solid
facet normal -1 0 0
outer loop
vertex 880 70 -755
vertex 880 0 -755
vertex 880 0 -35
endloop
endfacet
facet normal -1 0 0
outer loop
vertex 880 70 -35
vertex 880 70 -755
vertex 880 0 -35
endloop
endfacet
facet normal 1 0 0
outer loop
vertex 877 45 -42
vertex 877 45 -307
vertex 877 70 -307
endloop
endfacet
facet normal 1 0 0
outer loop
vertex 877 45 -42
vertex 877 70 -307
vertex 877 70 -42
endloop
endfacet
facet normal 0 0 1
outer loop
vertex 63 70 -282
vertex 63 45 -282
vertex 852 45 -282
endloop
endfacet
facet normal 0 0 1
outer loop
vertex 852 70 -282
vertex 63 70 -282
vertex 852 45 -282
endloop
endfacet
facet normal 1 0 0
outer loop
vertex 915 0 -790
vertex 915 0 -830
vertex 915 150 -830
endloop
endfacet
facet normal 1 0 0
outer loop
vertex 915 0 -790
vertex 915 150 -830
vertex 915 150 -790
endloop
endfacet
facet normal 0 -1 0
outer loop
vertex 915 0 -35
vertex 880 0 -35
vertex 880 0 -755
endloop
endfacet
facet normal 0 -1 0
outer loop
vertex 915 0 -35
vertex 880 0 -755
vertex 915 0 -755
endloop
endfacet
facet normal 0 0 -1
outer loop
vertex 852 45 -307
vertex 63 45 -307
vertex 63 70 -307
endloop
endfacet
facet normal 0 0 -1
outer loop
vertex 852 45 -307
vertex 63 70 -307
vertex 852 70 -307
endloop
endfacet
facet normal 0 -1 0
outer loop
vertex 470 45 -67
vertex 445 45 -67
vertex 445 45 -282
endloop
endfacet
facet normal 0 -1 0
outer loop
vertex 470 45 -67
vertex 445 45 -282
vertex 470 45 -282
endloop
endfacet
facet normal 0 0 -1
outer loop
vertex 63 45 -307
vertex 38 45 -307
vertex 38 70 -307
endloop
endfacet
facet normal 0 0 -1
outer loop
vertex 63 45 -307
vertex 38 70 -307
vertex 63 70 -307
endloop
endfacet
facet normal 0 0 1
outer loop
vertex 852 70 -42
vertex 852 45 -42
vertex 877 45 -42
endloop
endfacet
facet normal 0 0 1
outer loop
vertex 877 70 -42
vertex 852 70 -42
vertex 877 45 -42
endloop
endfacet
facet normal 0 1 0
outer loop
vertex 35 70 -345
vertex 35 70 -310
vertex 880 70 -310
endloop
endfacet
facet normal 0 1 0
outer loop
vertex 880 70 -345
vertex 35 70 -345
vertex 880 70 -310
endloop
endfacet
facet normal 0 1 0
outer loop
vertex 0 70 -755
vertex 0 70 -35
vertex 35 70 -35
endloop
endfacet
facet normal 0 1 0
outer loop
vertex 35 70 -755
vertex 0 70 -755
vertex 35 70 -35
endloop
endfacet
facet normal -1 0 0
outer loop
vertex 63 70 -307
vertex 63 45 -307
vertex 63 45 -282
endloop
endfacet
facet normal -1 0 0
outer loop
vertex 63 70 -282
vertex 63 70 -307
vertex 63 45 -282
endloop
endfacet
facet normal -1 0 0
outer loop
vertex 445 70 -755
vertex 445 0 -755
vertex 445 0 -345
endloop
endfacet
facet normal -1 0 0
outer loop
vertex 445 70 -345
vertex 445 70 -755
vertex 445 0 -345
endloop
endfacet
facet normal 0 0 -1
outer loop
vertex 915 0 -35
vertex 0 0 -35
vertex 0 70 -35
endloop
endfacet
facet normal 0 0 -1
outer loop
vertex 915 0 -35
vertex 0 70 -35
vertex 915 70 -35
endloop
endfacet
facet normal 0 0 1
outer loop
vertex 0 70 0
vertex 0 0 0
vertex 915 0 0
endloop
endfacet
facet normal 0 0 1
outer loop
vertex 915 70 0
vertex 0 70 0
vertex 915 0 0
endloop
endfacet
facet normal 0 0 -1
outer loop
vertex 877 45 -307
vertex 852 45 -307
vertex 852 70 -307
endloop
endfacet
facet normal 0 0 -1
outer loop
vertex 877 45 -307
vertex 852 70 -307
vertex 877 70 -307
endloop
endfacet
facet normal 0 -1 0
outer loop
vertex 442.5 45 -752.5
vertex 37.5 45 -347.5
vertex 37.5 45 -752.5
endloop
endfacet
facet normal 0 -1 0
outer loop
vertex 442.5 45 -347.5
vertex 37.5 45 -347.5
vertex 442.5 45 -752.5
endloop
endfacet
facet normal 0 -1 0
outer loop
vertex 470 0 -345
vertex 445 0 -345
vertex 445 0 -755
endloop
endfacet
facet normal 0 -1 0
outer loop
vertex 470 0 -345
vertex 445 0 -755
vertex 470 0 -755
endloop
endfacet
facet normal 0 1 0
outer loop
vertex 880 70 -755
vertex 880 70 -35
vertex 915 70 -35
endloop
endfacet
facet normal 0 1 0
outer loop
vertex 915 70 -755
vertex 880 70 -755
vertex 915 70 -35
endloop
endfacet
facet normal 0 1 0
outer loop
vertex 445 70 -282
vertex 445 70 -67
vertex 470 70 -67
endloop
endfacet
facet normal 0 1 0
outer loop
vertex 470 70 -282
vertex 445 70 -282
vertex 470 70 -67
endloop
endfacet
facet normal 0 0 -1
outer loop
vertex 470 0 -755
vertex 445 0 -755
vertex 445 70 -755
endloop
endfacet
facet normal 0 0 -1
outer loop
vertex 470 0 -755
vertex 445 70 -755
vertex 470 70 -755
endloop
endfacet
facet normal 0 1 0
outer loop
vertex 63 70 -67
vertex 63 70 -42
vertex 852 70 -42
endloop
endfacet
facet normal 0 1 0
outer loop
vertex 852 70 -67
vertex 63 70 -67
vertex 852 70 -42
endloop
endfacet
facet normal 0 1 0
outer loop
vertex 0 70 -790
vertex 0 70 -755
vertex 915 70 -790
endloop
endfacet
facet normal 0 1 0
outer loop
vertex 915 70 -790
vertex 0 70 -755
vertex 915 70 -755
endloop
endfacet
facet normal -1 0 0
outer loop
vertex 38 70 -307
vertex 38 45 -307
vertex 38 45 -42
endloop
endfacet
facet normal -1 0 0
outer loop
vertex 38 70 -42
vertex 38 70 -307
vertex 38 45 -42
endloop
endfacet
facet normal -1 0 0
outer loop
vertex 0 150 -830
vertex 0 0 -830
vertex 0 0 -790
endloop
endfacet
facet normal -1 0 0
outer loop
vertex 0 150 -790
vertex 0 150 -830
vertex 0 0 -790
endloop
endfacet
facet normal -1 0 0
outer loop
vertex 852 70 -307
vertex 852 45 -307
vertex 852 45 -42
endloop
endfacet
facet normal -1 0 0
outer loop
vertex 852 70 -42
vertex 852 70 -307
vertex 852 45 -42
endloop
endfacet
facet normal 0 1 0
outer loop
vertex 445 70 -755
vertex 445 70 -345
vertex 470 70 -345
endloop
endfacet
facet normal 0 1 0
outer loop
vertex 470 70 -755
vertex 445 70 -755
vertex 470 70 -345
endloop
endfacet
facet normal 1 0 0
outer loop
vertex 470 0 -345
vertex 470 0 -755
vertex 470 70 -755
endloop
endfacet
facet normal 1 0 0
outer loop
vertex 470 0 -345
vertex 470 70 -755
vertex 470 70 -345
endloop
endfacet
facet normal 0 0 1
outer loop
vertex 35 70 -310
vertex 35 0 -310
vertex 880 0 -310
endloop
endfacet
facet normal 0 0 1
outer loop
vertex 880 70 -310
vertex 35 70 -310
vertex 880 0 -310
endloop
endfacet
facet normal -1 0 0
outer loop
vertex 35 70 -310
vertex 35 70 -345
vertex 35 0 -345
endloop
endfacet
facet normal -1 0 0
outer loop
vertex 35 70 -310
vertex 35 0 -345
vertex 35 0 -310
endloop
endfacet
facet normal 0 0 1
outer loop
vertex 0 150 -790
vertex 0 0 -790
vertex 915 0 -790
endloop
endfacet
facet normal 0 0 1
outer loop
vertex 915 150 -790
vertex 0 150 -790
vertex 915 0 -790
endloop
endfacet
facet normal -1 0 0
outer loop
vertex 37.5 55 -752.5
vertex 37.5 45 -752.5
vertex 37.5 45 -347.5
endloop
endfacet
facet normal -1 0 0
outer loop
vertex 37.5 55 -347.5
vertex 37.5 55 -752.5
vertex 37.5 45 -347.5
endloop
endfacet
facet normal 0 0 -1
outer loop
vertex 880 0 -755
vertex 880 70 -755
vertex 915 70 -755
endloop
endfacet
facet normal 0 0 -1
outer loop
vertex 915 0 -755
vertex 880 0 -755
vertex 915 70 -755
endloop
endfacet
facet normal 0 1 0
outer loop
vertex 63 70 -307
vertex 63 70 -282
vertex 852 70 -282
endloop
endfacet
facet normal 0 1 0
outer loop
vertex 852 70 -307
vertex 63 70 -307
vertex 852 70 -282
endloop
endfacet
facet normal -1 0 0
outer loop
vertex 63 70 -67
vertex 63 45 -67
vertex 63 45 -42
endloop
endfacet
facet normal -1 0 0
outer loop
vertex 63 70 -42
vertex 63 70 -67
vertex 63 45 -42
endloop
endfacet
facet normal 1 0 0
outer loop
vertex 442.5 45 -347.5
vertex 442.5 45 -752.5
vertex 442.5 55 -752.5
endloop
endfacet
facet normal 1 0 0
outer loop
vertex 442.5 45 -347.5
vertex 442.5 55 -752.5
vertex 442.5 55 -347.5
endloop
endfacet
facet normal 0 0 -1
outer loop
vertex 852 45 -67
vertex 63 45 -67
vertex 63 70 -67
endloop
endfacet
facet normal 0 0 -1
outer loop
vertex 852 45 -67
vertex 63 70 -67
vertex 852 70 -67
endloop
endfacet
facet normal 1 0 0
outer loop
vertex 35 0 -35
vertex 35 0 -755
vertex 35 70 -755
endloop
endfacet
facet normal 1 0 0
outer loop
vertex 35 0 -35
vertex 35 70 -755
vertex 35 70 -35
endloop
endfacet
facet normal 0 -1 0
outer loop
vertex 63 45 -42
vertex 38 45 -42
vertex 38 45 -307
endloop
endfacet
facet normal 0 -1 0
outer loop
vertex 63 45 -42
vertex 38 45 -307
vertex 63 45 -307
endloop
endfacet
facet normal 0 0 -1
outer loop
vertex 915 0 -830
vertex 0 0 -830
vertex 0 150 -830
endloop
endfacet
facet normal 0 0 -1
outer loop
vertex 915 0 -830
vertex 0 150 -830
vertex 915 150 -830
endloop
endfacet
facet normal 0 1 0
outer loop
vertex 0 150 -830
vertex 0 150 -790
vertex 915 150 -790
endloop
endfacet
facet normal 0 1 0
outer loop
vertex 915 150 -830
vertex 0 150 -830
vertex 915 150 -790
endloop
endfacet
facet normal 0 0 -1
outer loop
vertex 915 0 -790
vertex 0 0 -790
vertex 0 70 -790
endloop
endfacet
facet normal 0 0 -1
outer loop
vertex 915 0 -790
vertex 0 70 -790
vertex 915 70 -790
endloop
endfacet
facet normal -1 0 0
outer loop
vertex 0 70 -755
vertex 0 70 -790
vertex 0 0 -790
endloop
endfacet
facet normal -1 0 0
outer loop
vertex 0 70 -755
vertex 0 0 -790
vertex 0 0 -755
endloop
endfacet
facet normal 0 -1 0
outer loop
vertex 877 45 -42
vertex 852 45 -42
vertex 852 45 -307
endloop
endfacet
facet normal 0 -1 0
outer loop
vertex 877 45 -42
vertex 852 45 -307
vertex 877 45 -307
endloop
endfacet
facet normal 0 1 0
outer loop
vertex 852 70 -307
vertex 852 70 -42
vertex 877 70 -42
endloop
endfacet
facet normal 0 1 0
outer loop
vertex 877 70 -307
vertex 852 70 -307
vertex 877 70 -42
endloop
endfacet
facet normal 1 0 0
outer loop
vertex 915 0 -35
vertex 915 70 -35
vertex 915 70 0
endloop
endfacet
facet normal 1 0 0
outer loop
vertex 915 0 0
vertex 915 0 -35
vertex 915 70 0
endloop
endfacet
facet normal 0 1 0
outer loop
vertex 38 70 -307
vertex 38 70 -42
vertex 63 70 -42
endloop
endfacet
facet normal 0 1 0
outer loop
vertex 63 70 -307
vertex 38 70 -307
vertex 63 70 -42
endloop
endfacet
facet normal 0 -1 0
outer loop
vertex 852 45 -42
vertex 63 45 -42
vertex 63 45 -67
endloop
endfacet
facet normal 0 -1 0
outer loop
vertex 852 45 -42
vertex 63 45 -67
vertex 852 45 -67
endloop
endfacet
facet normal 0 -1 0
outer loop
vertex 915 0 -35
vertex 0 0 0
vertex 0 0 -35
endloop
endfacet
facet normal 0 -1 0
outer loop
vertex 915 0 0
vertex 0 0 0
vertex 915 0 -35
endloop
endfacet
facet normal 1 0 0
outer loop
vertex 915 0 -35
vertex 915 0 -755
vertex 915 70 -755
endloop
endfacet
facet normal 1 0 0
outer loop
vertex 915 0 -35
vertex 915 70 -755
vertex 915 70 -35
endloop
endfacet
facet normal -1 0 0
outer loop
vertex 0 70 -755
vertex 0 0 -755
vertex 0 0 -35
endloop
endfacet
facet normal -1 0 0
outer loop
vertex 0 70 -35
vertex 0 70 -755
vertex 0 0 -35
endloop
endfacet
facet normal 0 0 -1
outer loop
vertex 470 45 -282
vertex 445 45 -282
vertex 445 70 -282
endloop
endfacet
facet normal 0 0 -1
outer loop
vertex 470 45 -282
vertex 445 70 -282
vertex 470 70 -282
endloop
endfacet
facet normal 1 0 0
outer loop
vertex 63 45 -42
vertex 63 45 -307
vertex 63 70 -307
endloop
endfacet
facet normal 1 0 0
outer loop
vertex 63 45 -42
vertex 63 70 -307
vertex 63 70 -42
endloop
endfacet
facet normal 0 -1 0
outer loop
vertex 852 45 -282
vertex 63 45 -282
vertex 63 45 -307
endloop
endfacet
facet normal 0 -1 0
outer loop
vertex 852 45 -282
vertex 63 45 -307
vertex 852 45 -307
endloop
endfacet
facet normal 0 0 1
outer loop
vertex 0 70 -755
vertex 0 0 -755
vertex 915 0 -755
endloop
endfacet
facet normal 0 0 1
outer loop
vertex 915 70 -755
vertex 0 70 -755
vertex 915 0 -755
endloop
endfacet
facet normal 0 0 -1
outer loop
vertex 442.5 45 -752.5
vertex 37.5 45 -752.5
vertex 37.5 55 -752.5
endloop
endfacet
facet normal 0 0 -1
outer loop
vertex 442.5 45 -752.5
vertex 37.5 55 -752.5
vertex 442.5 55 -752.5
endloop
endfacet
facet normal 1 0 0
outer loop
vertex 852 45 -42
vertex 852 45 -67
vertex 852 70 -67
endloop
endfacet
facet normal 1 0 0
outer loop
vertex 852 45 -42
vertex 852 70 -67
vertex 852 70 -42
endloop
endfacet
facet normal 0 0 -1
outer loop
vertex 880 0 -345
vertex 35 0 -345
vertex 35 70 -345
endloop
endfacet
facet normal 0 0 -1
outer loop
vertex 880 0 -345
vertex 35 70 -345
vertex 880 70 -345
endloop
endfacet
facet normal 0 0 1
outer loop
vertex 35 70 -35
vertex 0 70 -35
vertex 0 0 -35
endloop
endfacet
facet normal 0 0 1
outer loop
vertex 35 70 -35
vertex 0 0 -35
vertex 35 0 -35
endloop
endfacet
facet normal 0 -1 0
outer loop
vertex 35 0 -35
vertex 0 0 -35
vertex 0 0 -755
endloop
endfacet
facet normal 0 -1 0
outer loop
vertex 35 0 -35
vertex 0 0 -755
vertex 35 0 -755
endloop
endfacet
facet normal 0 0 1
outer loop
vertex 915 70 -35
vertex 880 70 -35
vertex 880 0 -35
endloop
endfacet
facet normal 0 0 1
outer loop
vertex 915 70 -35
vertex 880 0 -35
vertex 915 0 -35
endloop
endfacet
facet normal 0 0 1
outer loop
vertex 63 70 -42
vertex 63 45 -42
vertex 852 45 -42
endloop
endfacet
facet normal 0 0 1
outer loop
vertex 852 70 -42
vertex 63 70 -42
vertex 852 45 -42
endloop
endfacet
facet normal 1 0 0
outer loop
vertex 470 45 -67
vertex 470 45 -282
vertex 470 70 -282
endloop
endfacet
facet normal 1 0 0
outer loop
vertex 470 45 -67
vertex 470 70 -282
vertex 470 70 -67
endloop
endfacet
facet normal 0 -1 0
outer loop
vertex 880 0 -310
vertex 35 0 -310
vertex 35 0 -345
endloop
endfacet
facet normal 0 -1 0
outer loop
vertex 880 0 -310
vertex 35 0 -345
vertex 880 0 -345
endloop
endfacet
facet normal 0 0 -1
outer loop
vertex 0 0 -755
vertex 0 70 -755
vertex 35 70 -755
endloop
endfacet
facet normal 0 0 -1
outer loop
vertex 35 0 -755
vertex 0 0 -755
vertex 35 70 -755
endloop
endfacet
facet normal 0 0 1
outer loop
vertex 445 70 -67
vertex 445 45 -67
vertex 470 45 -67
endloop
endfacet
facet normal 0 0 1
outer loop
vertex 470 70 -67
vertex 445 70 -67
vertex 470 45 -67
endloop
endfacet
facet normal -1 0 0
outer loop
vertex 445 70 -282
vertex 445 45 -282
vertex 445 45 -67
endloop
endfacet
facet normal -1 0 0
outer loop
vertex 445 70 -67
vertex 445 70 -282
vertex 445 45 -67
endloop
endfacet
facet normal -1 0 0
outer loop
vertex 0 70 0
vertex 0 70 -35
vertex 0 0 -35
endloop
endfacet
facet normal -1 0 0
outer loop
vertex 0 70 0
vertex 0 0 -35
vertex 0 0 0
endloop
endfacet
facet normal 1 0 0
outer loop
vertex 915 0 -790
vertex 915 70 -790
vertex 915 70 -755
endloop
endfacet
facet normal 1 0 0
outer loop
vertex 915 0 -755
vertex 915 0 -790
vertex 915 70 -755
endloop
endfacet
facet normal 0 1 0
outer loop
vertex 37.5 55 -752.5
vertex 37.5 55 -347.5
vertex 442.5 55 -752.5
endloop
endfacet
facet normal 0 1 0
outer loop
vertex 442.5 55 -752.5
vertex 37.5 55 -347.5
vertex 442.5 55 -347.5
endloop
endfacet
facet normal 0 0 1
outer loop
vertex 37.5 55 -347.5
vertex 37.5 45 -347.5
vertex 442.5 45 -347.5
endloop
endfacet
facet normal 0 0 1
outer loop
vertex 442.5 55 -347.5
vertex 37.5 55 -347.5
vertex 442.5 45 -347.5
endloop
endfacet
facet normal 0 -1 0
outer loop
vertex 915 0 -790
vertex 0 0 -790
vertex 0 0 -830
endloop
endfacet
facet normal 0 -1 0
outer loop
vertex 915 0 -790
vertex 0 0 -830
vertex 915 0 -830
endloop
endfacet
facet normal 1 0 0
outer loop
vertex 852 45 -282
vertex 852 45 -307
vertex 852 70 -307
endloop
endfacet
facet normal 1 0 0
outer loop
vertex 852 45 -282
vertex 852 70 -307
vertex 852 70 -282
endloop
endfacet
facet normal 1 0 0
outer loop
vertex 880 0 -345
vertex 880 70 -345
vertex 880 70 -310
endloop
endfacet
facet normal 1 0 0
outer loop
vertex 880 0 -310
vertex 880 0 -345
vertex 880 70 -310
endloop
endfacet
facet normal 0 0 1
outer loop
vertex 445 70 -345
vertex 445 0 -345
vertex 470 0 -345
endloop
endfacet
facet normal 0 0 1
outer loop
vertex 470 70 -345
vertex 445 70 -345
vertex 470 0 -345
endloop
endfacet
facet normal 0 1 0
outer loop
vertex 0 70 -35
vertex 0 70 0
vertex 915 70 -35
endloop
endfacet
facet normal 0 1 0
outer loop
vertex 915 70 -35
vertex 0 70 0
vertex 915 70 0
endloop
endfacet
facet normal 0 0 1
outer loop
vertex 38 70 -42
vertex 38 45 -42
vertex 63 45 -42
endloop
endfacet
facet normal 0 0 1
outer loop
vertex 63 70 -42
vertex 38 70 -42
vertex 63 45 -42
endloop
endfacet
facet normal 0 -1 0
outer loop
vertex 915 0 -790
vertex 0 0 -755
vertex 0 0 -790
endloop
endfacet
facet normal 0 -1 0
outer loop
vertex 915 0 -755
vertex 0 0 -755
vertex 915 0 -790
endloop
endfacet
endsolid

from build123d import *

# Parameters (mm, degrees)
F4_W      = 915
F4_H      = 35
F11_DEPTH = 70
F5_W      = 915
F5_H      = 35
F12_DEPTH = 70
F6_W      = 845
F6_H      = 35
F13_DEPTH = 70
F7_W      = 35
F7_H      = 720
F14_DEPTH = 70
F8_W      = 35
F8_H      = 720
F15_DEPTH = 70
F9_W      = 25
F9_H      = 410
F16_DEPTH = 70
F18_W     = 789
F18_H     = 25
F23_DEPTH = 25
F19_W     = 789
F19_H     = 25
F24_DEPTH = 25
F20_W     = 25
F20_H     = 265
F25_DEPTH = 25
F21_W     = 25
F21_H     = 265
F26_DEPTH = 25
F22_W     = 25
F22_H     = 215
F27_DEPTH = 25
F29_W     = 405
F29_H     = 405
F30_DEPTH = 10
F10_W     = 915
F10_H     = 40
F31_DEPTH = 150


with BuildPart() as f11:
    # F4 (on Front) → F11 (new body, through all)
    with BuildSketch(Plane.XZ):
        with Locations((457.5, -17.5)):
            Rectangle(F4_W, F4_H)
    extrude(amount=-F11_DEPTH)


with BuildPart() as f12:
    # F5 (on Front) → F12 (new body, through all)
    with BuildSketch(Plane.XZ):
        with Locations((457.5, -772.5)):
            Rectangle(F5_W, F5_H)
    extrude(amount=-F12_DEPTH)


with BuildPart() as f13:
    # F6 (on Front) → F13 (new body, through all)
    with BuildSketch(Plane.XZ):
        with Locations((457.5, -327.5)):
            Rectangle(F6_W, F6_H)
    extrude(amount=-F13_DEPTH)


with BuildPart() as f14:
    # F7 (on Front) → F14 (new body, through all)
    with BuildSketch(Plane.XZ):
        with Locations((17.5, -395)):
            Rectangle(F7_W, F7_H)
    extrude(amount=-F14_DEPTH)


with BuildPart() as f15:
    # F8 (on Front) → F15 (new body, through all)
    with BuildSketch(Plane.XZ):
        with Locations((897.5, -395)):
            Rectangle(F8_W, F8_H)
    extrude(amount=-F15_DEPTH)


with BuildPart() as f16:
    # F9 (on Front) → F16 (new body, through all)
    with BuildSketch(Plane.XZ):
        with Locations((457.5, -550)):
            Rectangle(F9_W, F9_H)
    extrude(amount=-F16_DEPTH)


with BuildPart() as f23:
    # F18 (on plane+point) → F23 (new body, through all)
    with BuildSketch(Plane.XZ.offset(-45)):
        with Locations((457.5, -54.5)):
            Rectangle(F18_W, F18_H)
    extrude(amount=-F23_DEPTH)


with BuildPart() as f24:
    # F19 (on plane+point) → F24 (new body, through all)
    with BuildSketch(Plane.XZ.offset(-45)):
        with Locations((457.5, -294.5)):
            Rectangle(F19_W, F19_H)
    extrude(amount=-F24_DEPTH)


with BuildPart() as f25:
    # F20 (on plane+point) → F25 (new body, through all)
    with BuildSketch(Plane.XZ.offset(-45)):
        with Locations((50.5, -174.5)):
            Rectangle(F20_W, F20_H)
    extrude(amount=-F25_DEPTH)


with BuildPart() as f26:
    # F21 (on plane+point) → F26 (new body, through all)
    with BuildSketch(Plane.XZ.offset(-45)):
        with Locations((864.5, -174.5)):
            Rectangle(F21_W, F21_H)
    extrude(amount=-F26_DEPTH)


with BuildPart() as f27:
    # F22 (on plane+point) → F27 (new body, through all)
    with BuildSketch(Plane.XZ.offset(-45)):
        with Locations((457.5, -174.5)):
            Rectangle(F22_W, F22_H)
    extrude(amount=-F27_DEPTH)


with BuildPart() as f30:
    # F29 (on plane+point) → F30 (new body, through all)
    with BuildSketch(Plane.XZ.offset(-45)):
        with Locations((240, -550)):
            Rectangle(F29_W, F29_H)
    extrude(amount=-F30_DEPTH)


with BuildPart() as f31:
    # F10 (on Front) → F31 (new body)
    with BuildSketch(Plane.XZ):
        with Locations((457.5, -810)):
            Rectangle(F10_W, F10_H)
    extrude(amount=-F31_DEPTH)


solid = Compound([f11.part, f12.part, f13.part, f14.part, f15.part, f16.part, f23.part, f24.part, f25.part, f26.part, f27.part, f30.part, f31.part])
